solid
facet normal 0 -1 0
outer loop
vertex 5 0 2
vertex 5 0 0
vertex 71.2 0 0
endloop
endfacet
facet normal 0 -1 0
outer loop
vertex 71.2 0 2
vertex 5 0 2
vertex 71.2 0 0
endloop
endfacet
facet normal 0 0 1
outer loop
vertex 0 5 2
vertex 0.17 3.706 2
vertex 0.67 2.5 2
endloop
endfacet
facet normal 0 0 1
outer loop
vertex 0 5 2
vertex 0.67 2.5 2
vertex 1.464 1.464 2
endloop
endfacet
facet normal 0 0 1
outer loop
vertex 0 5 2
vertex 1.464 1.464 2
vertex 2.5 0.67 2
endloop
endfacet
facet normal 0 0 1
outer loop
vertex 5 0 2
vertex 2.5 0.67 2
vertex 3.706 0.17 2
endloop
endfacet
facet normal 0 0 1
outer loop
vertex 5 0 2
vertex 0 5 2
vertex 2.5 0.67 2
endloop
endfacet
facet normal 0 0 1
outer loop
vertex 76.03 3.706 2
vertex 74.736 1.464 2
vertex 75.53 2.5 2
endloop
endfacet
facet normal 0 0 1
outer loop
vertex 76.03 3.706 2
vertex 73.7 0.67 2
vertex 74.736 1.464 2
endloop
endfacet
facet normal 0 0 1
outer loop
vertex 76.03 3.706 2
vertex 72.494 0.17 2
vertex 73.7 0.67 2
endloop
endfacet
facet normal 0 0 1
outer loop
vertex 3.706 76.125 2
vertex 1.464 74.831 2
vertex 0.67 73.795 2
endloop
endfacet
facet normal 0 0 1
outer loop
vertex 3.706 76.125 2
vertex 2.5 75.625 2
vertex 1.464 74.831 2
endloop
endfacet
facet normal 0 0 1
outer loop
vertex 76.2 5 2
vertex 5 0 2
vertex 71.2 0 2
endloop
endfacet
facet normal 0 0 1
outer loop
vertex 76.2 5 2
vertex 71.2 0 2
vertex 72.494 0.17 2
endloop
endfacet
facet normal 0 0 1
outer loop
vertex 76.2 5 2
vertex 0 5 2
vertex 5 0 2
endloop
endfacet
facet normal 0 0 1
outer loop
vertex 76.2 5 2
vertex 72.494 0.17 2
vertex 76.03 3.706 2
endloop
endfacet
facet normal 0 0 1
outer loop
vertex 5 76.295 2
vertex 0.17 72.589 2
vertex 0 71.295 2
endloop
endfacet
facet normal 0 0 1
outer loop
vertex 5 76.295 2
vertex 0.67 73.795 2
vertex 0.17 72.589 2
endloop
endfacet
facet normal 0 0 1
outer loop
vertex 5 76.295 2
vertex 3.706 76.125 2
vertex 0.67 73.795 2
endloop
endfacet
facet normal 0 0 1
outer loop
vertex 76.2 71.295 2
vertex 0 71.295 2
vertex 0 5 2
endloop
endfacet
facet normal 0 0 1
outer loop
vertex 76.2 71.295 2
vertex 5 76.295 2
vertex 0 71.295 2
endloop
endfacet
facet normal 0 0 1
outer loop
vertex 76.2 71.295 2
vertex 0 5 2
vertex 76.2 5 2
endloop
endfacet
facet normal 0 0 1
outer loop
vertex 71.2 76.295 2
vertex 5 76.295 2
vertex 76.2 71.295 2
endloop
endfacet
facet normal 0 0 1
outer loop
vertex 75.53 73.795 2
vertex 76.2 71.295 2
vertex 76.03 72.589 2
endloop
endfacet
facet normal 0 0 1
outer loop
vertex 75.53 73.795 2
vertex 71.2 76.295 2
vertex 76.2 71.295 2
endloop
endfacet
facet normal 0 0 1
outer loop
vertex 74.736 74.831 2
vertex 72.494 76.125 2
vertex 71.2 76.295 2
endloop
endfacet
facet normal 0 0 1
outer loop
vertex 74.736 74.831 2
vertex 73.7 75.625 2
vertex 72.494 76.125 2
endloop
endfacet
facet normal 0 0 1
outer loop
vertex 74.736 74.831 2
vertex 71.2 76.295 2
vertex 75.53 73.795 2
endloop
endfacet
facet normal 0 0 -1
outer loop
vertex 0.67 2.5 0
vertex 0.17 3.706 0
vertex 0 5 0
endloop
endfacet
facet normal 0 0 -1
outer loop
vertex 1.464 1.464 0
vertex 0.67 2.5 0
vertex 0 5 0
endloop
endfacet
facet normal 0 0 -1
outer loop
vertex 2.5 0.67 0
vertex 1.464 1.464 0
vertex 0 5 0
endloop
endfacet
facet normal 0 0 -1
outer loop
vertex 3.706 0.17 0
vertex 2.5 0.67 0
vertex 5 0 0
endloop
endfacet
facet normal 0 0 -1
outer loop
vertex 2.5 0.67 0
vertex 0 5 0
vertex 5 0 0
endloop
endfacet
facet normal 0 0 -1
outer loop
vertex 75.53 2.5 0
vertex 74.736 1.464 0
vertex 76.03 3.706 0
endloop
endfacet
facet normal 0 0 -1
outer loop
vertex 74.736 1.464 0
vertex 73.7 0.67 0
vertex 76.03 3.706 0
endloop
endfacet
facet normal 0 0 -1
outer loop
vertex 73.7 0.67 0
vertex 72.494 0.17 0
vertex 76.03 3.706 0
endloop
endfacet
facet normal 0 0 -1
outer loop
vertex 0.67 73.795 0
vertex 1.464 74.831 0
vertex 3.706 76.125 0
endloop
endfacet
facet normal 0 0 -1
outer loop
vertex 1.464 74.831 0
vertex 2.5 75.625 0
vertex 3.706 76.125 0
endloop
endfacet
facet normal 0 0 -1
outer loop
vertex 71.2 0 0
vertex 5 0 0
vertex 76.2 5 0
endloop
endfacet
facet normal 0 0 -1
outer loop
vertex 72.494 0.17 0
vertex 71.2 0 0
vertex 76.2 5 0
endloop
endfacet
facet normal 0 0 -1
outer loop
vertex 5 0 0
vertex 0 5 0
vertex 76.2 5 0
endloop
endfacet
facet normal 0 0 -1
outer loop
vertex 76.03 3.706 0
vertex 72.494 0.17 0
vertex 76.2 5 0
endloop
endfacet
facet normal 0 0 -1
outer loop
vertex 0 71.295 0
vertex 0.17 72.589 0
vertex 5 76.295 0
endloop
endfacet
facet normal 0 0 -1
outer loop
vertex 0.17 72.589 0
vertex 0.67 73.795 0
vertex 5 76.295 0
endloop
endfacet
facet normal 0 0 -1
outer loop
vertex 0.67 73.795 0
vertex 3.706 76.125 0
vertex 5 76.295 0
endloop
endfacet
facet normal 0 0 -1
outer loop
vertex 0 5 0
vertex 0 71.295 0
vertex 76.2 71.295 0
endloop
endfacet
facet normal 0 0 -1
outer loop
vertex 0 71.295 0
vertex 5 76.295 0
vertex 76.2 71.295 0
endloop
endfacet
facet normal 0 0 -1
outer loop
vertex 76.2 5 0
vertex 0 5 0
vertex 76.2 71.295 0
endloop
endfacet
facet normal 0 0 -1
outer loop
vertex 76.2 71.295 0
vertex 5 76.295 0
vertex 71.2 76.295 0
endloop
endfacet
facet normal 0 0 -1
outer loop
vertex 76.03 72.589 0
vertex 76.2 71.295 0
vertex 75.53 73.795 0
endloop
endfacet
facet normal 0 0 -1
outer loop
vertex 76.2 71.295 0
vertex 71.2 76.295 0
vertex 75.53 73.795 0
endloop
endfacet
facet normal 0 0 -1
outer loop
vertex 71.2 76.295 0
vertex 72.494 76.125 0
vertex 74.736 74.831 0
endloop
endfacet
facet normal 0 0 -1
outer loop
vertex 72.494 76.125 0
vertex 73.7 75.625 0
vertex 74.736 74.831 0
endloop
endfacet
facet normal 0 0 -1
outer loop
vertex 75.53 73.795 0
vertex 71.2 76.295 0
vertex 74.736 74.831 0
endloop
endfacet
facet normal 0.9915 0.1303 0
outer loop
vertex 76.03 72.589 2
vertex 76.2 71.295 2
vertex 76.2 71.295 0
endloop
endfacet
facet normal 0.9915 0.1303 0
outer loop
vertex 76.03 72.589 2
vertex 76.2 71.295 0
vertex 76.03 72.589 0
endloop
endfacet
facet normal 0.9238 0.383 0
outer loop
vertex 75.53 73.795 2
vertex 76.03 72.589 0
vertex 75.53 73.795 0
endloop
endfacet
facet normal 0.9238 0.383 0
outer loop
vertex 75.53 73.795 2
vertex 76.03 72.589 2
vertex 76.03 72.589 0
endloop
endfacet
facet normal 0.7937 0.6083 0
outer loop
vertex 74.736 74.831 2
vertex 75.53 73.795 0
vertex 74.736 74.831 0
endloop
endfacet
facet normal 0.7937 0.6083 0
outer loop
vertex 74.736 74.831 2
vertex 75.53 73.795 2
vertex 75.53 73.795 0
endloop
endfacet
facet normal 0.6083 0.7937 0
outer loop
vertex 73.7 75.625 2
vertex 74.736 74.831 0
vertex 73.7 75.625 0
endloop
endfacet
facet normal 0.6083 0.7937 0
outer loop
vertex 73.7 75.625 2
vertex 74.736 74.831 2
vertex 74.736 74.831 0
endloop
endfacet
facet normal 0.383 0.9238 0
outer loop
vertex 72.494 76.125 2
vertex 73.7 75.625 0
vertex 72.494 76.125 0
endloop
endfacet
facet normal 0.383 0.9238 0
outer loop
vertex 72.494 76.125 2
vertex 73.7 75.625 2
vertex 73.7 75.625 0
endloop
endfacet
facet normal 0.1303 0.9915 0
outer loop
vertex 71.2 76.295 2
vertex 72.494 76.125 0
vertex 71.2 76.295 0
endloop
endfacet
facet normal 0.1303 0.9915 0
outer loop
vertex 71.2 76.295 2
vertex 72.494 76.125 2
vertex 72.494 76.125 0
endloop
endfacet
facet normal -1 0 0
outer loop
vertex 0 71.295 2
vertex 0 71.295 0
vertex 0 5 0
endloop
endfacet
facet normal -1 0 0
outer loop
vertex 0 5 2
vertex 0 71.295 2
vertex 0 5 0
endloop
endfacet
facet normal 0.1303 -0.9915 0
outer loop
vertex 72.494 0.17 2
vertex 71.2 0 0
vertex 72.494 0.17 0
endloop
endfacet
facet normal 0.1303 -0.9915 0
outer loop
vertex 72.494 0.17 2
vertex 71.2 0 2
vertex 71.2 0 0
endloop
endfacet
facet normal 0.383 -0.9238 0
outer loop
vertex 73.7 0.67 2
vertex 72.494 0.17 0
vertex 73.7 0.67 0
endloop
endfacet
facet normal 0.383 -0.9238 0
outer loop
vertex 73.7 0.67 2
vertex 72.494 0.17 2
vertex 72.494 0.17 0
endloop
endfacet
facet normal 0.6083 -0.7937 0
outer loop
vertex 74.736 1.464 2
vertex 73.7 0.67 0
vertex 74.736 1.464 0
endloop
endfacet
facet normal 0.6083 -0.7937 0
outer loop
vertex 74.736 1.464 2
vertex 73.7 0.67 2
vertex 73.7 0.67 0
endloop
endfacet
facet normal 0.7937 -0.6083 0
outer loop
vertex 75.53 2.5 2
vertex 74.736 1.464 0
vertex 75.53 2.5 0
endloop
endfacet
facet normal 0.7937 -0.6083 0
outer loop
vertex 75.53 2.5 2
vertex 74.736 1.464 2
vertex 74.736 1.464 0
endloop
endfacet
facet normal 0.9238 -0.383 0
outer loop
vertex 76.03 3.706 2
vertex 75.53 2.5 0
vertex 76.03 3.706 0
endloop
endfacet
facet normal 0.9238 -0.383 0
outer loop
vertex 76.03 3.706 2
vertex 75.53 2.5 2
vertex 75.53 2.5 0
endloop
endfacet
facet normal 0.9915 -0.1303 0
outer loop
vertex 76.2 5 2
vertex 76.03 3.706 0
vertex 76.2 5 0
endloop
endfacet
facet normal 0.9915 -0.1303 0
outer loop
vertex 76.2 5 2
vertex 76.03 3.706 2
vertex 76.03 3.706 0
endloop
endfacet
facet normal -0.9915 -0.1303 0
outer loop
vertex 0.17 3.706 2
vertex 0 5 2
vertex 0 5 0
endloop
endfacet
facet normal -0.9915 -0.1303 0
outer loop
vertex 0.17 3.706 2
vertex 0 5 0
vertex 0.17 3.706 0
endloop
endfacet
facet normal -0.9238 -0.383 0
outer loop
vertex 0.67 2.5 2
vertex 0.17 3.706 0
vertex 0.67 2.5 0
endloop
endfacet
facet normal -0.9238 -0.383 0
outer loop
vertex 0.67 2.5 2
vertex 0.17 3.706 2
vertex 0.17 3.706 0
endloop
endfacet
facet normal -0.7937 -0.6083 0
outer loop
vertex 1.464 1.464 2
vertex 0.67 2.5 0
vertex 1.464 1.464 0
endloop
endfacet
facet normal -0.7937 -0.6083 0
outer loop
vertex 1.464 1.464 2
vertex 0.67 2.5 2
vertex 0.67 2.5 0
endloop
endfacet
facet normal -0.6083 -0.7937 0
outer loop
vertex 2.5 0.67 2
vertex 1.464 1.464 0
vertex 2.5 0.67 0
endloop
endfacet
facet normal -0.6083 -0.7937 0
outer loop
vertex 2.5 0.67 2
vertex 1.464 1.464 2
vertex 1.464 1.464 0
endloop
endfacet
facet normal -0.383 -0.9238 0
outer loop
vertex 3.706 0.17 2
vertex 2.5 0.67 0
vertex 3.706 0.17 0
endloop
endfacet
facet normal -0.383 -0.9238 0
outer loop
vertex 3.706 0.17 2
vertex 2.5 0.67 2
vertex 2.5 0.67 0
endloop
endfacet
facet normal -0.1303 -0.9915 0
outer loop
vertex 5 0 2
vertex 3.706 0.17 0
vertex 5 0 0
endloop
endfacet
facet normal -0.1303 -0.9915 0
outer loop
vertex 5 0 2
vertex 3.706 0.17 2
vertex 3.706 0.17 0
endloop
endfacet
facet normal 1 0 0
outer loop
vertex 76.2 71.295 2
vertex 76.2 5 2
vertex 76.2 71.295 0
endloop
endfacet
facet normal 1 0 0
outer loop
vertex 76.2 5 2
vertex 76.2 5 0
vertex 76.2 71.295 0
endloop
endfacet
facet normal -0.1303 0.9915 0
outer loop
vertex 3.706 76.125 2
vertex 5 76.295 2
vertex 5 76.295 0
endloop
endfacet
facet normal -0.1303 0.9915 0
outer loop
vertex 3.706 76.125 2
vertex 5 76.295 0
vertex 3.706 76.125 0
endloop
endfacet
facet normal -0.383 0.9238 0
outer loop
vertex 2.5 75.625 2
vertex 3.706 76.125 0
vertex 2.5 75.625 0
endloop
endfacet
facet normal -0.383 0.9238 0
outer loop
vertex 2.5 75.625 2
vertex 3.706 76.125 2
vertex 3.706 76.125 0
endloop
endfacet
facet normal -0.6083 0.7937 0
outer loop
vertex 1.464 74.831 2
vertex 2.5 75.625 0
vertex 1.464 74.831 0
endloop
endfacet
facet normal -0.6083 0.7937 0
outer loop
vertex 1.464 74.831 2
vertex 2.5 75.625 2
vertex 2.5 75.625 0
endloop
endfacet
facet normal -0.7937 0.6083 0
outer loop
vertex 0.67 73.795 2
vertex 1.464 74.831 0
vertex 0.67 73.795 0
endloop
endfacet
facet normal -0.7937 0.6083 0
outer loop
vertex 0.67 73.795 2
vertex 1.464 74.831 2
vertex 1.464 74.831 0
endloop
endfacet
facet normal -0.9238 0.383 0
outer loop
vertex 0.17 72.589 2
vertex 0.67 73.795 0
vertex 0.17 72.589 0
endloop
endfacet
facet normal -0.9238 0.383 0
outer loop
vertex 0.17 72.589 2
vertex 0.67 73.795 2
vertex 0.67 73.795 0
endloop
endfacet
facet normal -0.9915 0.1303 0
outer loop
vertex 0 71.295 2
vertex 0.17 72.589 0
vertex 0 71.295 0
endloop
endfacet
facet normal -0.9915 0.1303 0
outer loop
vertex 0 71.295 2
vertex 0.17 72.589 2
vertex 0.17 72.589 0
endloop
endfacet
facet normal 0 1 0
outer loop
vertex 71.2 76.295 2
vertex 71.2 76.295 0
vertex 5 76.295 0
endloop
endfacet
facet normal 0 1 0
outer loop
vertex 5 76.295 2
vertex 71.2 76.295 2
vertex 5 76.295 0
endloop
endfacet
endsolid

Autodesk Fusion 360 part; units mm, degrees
sketch "Sketch1" plane through (0, 0, 0) normal (0, 0, 1) x (1, 0, 0)
  line L0 (0, 0) -> (-70, 0)
  line L1 (-70, 0) -> (-70, -50.9434)
  line L2 (-70, -50.9434) -> (0, -50.9434)
  line L3 (0, -50.9434) -> (0, 0)
  dimension "d1" = 70
sketch "Sketch2" plane through (0, 0, 0) normal (0, 0, 1) x (1, 0, 0)
  line L0 (0, 0) -> (76.2, 0)
  line L1 (76.2, 0) -> (76.2, 76.2952)
  line L2 (76.2, 76.2952) -> (0, 76.2952)
  line L3 (0, 76.2952) -> (0, 0)
  dimension "d4" = 76.2
extrude "Extrude2" add sketch "Sketch2" along normal blind 2
fillet "Fillet1" radius 5 4 edges at (0, 76.2952, 1) (76.2, 76.2952, 1) (0, 0, 1) (76.2, 0, 1)
